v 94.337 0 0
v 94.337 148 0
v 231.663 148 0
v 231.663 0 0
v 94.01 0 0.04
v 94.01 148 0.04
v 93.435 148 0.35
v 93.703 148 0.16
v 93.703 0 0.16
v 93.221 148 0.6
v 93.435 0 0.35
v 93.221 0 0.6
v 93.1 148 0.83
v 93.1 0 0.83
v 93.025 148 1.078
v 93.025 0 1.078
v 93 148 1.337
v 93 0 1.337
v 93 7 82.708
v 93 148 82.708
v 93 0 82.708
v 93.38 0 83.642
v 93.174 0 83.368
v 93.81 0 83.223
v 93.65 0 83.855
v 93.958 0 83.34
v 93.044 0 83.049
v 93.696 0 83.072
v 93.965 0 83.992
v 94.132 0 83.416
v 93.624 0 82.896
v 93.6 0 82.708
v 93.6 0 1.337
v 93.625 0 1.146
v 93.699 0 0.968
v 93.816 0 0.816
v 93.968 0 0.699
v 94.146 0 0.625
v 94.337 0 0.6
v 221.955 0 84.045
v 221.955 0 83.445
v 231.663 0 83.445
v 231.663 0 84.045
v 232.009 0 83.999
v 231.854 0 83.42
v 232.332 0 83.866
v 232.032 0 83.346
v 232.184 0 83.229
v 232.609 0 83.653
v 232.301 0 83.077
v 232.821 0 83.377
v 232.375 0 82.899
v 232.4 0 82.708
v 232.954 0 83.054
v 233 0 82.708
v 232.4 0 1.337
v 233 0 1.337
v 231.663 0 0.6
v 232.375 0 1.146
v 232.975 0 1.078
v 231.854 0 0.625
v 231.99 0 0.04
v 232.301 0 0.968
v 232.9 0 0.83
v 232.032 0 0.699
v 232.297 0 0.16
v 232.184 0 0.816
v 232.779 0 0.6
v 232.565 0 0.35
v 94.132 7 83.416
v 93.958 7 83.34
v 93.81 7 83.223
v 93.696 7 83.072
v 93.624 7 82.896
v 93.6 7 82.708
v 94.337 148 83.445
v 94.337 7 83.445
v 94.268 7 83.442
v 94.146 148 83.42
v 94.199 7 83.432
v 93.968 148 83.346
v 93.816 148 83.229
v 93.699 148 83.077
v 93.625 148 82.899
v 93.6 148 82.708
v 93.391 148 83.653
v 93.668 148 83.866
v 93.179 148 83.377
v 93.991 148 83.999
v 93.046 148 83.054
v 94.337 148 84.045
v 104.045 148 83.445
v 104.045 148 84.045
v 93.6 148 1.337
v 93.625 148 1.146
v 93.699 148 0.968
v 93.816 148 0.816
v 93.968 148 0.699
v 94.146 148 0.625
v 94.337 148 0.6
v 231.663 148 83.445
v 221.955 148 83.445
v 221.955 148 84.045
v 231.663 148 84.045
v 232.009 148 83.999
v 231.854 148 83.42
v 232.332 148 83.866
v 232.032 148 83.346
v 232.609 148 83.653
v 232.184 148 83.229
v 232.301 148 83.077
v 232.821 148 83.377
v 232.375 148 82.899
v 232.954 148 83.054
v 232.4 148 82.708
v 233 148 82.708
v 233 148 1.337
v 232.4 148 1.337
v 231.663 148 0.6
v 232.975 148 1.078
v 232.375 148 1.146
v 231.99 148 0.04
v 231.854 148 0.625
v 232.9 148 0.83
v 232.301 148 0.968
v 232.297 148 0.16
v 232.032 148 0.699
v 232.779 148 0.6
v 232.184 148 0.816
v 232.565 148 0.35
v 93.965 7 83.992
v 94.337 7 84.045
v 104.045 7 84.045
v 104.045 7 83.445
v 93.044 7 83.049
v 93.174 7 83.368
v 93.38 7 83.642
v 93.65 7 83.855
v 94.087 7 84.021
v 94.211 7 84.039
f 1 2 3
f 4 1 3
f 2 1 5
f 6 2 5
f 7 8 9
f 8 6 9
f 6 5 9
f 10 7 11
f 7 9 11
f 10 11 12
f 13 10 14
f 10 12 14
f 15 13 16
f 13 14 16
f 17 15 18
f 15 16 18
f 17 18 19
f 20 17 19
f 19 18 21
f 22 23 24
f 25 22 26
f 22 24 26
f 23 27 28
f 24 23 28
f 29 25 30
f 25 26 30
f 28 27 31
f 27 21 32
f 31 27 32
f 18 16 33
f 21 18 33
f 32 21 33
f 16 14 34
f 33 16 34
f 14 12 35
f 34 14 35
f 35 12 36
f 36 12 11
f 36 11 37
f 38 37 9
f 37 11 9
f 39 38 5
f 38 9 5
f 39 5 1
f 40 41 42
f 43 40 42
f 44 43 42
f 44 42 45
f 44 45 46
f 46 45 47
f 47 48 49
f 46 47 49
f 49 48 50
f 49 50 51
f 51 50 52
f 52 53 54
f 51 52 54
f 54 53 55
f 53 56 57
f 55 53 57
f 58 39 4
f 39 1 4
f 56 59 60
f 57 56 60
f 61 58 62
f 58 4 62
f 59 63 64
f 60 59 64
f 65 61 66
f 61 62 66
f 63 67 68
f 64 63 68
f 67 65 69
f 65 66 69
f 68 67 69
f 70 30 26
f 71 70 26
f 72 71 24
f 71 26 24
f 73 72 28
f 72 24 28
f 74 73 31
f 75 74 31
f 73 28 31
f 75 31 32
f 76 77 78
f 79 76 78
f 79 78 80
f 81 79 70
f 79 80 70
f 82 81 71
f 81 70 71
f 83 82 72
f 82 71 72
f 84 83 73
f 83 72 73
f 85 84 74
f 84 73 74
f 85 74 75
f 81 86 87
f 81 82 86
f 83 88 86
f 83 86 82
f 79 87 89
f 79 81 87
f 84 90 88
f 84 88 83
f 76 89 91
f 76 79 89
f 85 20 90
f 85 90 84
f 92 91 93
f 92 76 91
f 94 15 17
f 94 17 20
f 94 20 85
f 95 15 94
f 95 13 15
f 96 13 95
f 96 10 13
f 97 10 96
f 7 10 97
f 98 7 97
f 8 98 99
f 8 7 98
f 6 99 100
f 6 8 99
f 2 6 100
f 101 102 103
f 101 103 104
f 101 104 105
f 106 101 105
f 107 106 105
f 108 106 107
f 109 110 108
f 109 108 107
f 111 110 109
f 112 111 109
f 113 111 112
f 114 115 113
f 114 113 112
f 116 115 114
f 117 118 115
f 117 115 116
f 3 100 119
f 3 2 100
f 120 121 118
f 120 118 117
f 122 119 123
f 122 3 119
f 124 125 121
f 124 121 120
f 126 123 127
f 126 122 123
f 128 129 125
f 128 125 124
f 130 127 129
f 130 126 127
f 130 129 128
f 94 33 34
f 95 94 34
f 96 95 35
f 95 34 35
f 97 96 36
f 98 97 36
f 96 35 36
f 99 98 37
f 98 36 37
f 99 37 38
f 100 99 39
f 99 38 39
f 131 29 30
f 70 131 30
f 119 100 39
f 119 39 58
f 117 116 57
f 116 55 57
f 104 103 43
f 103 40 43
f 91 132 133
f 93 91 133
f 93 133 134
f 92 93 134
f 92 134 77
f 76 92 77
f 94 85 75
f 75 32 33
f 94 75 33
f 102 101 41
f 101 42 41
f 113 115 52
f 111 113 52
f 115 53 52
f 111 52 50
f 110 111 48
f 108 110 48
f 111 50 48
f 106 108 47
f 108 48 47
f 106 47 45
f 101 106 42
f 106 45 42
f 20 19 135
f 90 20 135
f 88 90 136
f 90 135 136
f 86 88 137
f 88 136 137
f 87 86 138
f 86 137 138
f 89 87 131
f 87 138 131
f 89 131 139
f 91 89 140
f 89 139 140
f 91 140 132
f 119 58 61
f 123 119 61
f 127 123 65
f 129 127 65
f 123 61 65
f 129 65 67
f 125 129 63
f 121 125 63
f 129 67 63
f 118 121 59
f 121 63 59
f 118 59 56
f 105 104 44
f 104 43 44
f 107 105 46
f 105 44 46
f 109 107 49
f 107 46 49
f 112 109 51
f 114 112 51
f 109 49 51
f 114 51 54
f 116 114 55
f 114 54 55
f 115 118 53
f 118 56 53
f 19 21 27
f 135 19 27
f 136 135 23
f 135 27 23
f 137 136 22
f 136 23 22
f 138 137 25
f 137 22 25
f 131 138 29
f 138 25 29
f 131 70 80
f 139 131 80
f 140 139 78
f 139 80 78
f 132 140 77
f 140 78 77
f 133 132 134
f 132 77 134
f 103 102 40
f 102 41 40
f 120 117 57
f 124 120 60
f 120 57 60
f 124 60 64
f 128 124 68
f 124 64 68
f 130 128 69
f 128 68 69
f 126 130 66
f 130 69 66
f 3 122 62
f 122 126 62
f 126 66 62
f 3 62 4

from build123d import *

# Parameters (mm, degrees)
BASE_FLANGE1_DEPTH     = 0.6
SKETCHED_BEND1_DEPTH   = 148
SKETCHED_START         = 7
SKETCHED_BEND1_2_DEPTH = 141
SKETCHED_BEND1_3_DEPTH = 7


# Read off the part's stored shape, not the designer's step: Sketched Bend1
# Sheet-metal steps are written as plain solids
with BuildPart() as part:
    # Sketch1 → Base-Flange1 (new body)
    with BuildSketch(Plane.XY):
        Polygon((0, 7), (10, 7), (10, 0), (326, 0), (326, 148), (0, 148), align=None)
    extrude(amount=BASE_FLANGE1_DEPTH)

    # Sketched Bend1 outline → Sketched Bend1 (cut)
    with BuildSketch(Plane(origin=(0, 0, 0), x_dir=(1, 0, 0), z_dir=(0, 1, 0))):
        with BuildLine():
            ThreePointArc((93.221288384, -0.6), (93.703370184, -0.159519051), (94.3366, 0))
            Line((94.3366, 0), (0, 0))
            Line((0, 0), (0, -0.6))
            Line((0, -0.6), (93.221288384, -0.6))
        make_face()
        with BuildLine():
            ThreePointArc((231.6634, 0), (232.296629816, -0.159519051), (232.778711616, -0.6))
            Line((232.778711616, -0.6), (326, -0.6))
            Line((326, -0.6), (326, 0))
            Line((326, 0), (231.6634, 0))
        make_face()
    extrude(amount=SKETCHED_BEND1_DEPTH, mode=Mode.SUBTRACT)

    # Sketched Bend1 2 outline → Sketched Bend1 2 (add)
    with BuildSketch(Plane(origin=(0, 0, 0), x_dir=(1, 0, 0), z_dir=(0, 1, 0)).offset(SKETCHED_START)):
        with BuildLine():
            Line((93.6, -82.708312528), (93.6, -1.3366))
            ThreePointArc((93.6, -1.3366), (93.815745145, -0.815745145), (94.3366, -0.6))
            Line((94.3366, -0.6), (93.221288384, -0.6))
            ThreePointArc((93.221288384, -0.6), (93.056516982, -0.952039176), (93, -1.3366))
            Line((93, -1.3366), (93, -82.708312528))
            ThreePointArc((93, -82.708312528), (93.391481076, -83.653431451), (94.3366, -84.044912528))
            Line((94.3366, -84.044912528), (104.044912528, -84.044912528))
            Line((104.044912528, -84.044912528), (104.044912528, -83.444912528))
            Line((104.044912528, -83.444912528), (94.3366, -83.444912528))
            ThreePointArc((94.3366, -83.444912528), (93.815745145, -83.229167383), (93.6, -82.708312528))
        make_face()
        with BuildLine():
            Line((232.778711616, -0.6), (231.6634, -0.6))
            ThreePointArc((231.6634, -0.6), (232.184254855, -0.815745145), (232.4, -1.3366))
            Line((232.4, -1.3366), (232.4, -82.708312528))
            ThreePointArc((232.4, -82.708312528), (232.184254855, -83.229167383), (231.6634, -83.444912528))
            Line((231.6634, -83.444912528), (221.955087472, -83.444912528))
            Line((221.955087472, -83.444912528), (221.955087472, -84.044912528))
            Line((221.955087472, -84.044912528), (231.6634, -84.044912528))
            ThreePointArc((231.6634, -84.044912528), (232.608518924, -83.653431451), (233, -82.708312528))
            Line((233, -82.708312528), (233, -1.3366))
            ThreePointArc((233, -1.3366), (232.943483018, -0.952039176), (232.778711616, -0.6))
        make_face()
    extrude(amount=SKETCHED_BEND1_2_DEPTH)

    # Sketched Bend1 3 outline → Sketched Bend1 3 (add)
    with BuildSketch(Plane(origin=(0, 0, 0), x_dir=(1, 0, 0), z_dir=(0, 1, 0))):
        with BuildLine():
            Line((93.6, -82.708312528), (93.6, -1.3366))
            ThreePointArc((93.6, -1.3366), (93.815745145, -0.815745145), (94.3366, -0.6))
            Line((94.3366, -0.6), (93.221288384, -0.6))
            ThreePointArc((93.221288384, -0.6), (93.056516982, -0.952039176), (93, -1.3366))
            Line((93, -1.3366), (93, -82.708312528))
            ThreePointArc((93, -82.708312528), (93.268285315, -83.511558003), (93.965439614, -83.992345054))
            Line((93.965439614, -83.992345054), (94.132053583, -83.415942603))
            ThreePointArc((94.132053583, -83.415942603), (93.747851985, -83.150980953), (93.6, -82.708312528))
        make_face()
        with BuildLine():
            Line((232.778711616, -0.6), (231.6634, -0.6))
            ThreePointArc((231.6634, -0.6), (232.184254855, -0.815745145), (232.4, -1.3366))
            Line((232.4, -1.3366), (232.4, -82.708312528))
            ThreePointArc((232.4, -82.708312528), (232.184254855, -83.229167383), (231.6634, -83.444912528))
            Line((231.6634, -83.444912528), (221.955087472, -83.444912528))
            Line((221.955087472, -83.444912528), (221.955087472, -84.044912528))
            Line((221.955087472, -84.044912528), (231.6634, -84.044912528))
            ThreePointArc((231.6634, -84.044912528), (232.608518924, -83.653431451), (233, -82.708312528))
            Line((233, -82.708312528), (233, -1.3366))
            ThreePointArc((233, -1.3366), (232.943483018, -0.952039176), (232.778711616, -0.6))
        make_face()
    extrude(amount=SKETCHED_BEND1_3_DEPTH)


solid = part.part
